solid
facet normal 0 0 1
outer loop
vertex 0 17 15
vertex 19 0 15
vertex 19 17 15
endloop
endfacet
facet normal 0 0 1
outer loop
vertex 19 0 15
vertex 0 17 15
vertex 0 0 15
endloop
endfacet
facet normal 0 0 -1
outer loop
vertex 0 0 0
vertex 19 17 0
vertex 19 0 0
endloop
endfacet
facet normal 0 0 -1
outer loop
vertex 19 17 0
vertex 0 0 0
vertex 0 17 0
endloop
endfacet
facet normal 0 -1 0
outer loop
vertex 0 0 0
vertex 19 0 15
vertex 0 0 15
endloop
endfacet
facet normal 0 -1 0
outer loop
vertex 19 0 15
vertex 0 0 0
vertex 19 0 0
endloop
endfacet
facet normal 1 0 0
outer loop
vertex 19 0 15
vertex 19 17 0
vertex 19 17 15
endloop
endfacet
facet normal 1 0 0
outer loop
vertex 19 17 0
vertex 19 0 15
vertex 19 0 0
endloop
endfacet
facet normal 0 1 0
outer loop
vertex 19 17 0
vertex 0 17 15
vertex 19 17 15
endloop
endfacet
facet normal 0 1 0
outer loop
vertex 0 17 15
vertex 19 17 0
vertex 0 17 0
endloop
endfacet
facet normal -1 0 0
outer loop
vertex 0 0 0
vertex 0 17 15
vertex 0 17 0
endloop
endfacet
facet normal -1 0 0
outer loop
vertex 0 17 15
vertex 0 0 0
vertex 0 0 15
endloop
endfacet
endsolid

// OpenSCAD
// Generated by SolidPython 1.0.1 on 2020-07-29 00:46:56


cube(size = [19, 17, 15]);
/***********************************************
*********      SolidPython code:      **********
************************************************
 
# import packages: SolidPython
from solid import *
from solid.utils import *
from itertools import chain, combinations, permutations


class Resize:

    def __init__(self, scad_file):
        self.scad_file = scad_file
        #self.scad_file = import_scad(scad_file)
        # cone/cylinder param:
        self.r1 = 0
        self.r2 = 0
        self.h = 0
        # rectangular prism param:
        self.w = 0
        self.l = 0
        # ellipse param:
        self.r = 0

    # import OpenScad code (file name corresponds to shape)


    # classify shape + parameters
    def assign(self, param1, param2, param3):
        if self.scad_file == 'cone.scad':
            self.r1 = param1
            self.r2 = param2
            self.h = param3
        elif self.scad_file == 'cylinder.scad':
            self.r1 = param1
            self.r2 = param2
            self.h = param3
        elif self.scad_file == 'rectangularPrism.scad':
            self.h = param1
            self.l = param2
            self.w = param3
        else:
            self.r = param1
            self.h = param2

    # resize parameters
    def iterate(self):
        x = range(3, 20, 2)
        i = 1
        if self.scad_file == 'cone.scad':
            tempList = list(permutations(x, 2))
            for temp in tempList:
                param1 = temp[0]
                param2 = temp[1]
                filepath = 'produced_scad_files/' + 'cone' + str(param1) + '_' + str(param2) + '_' + '.scad'
                scad_render_to_file(cylinder(h=param1, r1=param2, r2=0), filepath)

        elif self.scad_file == 'cylinder.scad':
            tempList = list(permutations(x, 3))
            for temp in tempList:
                param1 = temp[0]
                param2 = temp[1]
                filepath = 'produced_scad_files/' + 'cylinder' + str(param1) + '_' + str(param2) + '_' + '.scad'
                scad_render_to_file(cylinder(h=param1, r1=param2, r2=param2), filepath)

        elif self.scad_file == 'rectangularPrism.scad':
            tempList = list(permutations(x, 3))
            for temp in tempList:
                param1 = temp[0]
                param2 = temp[1]
                param3 = temp[2]
                filepath = 'produced_scad_files/' + 'rectangularPrism' + str(param1) + '_' + str(param2) + '_' + str(
                    param3) + '.scad'
                scad_render_to_file(cube(size=(param1, param2, param3)), filepath)

        elif self.scad_file == 'ellipse.scad':
            tempList = list(permutations(x, 4))
            for temp in tempList:
                param1 = temp[0]
                param2 = temp[1]
                param3 = temp[2]
                param4 = temp[3]
                filepath = 'produced_scad_files/' + 'ellipse' + str(param1) + '_' + str(param2) + '_' + str(param3) + '_' + str(param4) + '.scad'
                scad_render_to_file(scale([param1, param2, param3])(sphere(r=param4)), filepath)

    def render_to_scadfile(self):
        scad_render_to_file(scad, 'example.scad') 
 
************************************************/
